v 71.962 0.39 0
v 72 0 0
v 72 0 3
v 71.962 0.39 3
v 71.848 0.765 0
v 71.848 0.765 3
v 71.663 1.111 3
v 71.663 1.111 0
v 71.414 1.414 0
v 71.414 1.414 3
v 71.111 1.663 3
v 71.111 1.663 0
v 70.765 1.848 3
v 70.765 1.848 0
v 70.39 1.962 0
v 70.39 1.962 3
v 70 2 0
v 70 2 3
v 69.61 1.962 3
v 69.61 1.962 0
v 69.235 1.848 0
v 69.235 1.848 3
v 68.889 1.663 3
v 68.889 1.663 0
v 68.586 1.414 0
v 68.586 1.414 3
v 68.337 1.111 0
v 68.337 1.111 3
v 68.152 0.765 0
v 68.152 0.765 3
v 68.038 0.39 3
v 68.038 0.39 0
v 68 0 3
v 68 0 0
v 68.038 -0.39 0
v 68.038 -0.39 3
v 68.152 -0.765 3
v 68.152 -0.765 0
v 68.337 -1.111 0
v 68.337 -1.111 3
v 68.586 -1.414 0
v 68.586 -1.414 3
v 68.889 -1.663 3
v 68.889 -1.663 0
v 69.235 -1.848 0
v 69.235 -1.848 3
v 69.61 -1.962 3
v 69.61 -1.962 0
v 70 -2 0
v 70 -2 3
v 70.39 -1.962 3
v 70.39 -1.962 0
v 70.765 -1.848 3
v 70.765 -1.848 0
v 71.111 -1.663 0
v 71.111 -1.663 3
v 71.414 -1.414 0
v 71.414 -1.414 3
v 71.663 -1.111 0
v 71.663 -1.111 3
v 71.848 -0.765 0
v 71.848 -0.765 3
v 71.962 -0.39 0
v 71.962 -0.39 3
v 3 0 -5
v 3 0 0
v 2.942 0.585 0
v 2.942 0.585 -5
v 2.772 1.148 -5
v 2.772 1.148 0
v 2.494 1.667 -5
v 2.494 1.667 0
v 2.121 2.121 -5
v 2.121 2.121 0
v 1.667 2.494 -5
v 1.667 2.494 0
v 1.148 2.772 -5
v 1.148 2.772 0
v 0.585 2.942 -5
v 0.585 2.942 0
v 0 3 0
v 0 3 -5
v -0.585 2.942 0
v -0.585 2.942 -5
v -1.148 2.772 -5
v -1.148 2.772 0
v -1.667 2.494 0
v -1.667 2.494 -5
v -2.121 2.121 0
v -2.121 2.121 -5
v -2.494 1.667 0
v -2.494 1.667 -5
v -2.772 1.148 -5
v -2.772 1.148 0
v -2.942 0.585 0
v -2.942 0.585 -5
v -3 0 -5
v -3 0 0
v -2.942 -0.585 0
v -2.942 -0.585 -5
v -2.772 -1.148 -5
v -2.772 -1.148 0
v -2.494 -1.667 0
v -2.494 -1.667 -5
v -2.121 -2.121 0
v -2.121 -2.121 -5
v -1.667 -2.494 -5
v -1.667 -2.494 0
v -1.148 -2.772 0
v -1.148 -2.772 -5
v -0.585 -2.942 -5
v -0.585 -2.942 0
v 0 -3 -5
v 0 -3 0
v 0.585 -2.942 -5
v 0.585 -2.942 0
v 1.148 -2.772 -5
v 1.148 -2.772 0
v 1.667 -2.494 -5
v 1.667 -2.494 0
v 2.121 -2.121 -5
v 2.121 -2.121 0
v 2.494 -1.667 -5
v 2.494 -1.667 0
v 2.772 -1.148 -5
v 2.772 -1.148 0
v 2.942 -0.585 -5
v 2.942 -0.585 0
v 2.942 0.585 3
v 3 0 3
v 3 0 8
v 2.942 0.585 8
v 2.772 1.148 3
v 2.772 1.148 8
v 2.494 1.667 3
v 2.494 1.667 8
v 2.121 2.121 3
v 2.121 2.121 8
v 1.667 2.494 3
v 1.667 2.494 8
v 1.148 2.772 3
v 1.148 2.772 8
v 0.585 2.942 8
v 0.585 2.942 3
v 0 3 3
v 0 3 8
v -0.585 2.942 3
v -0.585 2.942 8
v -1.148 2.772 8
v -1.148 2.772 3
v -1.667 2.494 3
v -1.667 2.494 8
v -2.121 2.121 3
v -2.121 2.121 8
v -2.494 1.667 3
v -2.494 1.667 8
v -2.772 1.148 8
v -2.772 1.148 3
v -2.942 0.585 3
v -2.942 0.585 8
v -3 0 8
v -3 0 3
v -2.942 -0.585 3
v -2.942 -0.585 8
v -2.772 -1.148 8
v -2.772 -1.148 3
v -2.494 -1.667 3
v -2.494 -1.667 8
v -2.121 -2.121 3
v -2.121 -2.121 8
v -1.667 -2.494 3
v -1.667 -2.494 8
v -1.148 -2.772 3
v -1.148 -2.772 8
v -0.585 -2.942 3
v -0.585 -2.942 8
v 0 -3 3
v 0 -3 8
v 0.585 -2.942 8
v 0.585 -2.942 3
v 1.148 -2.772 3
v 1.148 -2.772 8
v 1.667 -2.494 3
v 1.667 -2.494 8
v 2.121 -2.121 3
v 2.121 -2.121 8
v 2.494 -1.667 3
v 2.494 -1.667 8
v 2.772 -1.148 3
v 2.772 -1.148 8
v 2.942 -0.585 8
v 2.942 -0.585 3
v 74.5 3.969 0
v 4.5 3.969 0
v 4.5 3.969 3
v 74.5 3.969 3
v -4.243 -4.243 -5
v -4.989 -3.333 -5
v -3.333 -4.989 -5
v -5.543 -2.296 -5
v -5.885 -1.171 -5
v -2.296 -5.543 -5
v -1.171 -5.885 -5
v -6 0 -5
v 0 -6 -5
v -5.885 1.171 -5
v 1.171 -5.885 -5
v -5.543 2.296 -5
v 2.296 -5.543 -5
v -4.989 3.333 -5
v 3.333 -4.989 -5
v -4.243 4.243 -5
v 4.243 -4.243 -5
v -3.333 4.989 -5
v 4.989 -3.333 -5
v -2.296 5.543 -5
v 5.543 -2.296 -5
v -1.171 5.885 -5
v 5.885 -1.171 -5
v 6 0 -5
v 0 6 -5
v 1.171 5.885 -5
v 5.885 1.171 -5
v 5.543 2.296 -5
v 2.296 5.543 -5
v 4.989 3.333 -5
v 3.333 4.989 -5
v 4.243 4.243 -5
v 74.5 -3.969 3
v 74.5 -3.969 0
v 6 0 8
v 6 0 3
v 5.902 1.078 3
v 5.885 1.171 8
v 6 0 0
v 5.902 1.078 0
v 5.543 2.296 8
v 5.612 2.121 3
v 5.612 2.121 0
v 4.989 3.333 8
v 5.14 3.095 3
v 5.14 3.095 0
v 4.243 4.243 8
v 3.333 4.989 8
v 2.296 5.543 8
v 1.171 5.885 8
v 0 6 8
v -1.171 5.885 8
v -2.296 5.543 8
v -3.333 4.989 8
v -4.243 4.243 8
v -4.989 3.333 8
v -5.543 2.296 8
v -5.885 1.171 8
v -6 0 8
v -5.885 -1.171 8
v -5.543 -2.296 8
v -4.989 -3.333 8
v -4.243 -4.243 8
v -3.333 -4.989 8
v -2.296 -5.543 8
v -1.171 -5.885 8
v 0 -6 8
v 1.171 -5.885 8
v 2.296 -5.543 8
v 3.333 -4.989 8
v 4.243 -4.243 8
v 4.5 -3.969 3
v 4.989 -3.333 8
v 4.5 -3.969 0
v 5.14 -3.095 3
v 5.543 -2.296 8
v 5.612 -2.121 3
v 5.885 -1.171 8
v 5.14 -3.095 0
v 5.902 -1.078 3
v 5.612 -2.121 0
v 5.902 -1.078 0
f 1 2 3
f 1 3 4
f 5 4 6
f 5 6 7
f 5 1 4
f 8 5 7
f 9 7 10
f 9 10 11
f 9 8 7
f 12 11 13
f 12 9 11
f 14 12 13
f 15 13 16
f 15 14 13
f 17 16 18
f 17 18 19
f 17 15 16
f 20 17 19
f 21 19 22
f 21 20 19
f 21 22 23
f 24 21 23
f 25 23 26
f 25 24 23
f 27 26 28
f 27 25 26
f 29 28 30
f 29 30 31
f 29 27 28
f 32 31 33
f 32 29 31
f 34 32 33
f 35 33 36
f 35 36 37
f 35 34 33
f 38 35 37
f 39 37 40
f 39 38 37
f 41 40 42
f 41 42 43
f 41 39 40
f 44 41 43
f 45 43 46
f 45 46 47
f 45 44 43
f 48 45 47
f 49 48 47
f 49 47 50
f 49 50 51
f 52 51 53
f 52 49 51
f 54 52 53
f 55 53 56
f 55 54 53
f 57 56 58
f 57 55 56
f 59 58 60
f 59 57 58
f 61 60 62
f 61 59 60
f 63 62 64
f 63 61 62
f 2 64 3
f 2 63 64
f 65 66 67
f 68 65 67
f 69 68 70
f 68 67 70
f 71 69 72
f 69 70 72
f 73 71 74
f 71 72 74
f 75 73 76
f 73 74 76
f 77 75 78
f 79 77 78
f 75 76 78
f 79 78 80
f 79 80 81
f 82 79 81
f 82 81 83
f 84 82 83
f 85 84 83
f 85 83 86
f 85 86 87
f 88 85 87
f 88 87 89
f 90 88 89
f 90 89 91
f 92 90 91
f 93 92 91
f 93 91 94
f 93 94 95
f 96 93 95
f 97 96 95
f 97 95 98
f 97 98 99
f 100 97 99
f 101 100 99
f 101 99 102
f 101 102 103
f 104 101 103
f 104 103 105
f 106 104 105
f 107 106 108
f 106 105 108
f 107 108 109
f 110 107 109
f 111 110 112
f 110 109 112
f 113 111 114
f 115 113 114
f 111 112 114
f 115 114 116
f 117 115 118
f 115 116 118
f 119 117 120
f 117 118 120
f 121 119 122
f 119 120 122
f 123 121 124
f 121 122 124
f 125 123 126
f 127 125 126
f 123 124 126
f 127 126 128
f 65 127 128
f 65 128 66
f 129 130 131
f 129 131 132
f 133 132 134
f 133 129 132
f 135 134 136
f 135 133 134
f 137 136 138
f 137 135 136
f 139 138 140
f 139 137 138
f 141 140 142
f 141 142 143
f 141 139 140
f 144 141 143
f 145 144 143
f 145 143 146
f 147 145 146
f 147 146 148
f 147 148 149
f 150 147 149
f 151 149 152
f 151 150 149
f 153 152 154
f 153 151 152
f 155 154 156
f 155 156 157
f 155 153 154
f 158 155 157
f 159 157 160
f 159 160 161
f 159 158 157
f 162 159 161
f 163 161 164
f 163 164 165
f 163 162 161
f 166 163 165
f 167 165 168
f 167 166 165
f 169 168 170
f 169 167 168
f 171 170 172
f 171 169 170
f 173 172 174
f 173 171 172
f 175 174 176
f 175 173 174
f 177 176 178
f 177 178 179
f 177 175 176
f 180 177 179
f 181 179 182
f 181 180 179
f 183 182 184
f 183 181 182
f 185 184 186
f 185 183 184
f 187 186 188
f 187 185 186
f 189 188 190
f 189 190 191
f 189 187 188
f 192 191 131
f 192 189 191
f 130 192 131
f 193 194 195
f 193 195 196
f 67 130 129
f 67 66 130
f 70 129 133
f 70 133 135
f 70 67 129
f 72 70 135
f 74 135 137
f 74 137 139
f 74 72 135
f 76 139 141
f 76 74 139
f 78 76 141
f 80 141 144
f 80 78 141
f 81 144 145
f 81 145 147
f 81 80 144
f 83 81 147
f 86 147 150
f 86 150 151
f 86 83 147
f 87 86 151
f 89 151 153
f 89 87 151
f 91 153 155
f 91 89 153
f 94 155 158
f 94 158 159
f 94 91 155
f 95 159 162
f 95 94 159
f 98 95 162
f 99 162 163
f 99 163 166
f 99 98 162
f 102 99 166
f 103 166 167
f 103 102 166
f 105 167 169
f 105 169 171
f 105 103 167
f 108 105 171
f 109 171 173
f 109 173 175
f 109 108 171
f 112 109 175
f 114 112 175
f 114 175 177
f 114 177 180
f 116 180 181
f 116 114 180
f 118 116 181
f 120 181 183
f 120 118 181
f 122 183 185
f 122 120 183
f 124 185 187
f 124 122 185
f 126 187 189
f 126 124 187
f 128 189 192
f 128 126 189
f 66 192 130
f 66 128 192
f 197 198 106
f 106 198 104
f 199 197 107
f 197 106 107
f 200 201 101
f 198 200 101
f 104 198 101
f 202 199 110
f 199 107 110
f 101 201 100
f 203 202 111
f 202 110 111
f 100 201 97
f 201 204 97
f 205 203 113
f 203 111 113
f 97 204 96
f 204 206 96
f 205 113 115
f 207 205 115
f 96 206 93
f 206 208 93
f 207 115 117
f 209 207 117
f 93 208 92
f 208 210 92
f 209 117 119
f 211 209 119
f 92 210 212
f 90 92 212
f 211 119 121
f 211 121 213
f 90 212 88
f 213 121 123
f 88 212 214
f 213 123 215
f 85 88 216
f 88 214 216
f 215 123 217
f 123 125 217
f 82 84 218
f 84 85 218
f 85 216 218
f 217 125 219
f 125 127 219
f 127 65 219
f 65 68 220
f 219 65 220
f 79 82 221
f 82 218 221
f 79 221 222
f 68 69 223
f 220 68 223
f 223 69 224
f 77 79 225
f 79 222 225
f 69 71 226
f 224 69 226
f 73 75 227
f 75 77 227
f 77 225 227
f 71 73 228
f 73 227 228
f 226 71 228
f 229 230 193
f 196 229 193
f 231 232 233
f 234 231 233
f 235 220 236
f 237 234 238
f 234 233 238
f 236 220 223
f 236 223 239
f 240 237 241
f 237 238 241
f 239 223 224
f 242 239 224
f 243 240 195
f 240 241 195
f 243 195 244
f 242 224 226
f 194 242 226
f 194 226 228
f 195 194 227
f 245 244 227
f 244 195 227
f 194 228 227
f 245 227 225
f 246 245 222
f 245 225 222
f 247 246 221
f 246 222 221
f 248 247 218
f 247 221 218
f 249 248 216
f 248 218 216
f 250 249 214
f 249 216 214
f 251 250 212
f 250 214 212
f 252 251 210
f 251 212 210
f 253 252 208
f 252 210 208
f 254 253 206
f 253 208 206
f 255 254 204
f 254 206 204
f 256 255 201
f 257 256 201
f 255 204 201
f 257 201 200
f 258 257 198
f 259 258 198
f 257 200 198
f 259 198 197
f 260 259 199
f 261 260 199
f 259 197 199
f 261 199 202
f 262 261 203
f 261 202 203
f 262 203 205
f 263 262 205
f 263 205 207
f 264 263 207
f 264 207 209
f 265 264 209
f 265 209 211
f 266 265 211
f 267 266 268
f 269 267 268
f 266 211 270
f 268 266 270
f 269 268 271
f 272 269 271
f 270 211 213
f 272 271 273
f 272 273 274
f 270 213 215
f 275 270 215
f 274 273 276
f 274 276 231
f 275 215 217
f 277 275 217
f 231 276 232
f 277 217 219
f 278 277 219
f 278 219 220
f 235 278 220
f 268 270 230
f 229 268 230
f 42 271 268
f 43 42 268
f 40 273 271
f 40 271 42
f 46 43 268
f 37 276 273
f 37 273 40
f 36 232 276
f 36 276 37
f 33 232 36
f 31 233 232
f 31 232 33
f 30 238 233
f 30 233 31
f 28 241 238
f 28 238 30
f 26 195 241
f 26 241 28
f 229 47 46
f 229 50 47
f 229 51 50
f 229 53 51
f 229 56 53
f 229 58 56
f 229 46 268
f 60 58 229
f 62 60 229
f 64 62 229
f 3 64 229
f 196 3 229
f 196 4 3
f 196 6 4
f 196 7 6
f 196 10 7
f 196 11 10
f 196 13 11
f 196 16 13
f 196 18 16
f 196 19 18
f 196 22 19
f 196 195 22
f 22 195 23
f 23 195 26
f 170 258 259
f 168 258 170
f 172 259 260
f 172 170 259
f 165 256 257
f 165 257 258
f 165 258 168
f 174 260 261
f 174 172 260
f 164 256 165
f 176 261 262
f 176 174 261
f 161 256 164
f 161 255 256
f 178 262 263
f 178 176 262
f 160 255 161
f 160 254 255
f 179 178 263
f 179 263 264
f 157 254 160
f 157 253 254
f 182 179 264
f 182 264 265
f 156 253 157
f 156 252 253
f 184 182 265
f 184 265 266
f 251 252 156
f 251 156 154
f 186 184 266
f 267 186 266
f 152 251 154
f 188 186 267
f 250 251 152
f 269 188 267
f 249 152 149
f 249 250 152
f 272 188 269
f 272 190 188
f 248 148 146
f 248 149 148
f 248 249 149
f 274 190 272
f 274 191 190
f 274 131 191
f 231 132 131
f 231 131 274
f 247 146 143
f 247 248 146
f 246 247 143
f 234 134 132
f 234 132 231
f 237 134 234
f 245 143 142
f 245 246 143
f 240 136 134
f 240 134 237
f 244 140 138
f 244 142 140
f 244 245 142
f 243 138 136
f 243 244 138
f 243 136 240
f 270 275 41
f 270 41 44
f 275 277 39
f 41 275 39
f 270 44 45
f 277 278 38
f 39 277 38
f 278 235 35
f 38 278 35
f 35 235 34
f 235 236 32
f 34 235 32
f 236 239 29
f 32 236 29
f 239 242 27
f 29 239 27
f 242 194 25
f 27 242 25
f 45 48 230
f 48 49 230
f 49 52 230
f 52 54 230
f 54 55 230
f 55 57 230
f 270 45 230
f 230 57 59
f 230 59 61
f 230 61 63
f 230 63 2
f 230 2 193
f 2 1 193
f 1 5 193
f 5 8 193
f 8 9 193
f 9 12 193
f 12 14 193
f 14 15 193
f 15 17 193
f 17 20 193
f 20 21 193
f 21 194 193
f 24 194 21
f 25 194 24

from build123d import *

# Parameters (mm, degrees)
SKETCH1_R                = 6
SKETCH1_R_2              = 3
SKETCH1_W                = 70
SKETCH1_H                = 7.937253934
SKETCH1_R_3              = 2
BOSS_EXTRUDE1_DEPTH      = 3
SKETCH2_R                = 6
SKETCH2_R_2              = 3
BOSS_EXTRUDE2_DEPTH      = 5
BOSS_EXTRUDE2_DEPTH_BACK = 8


with BuildPart() as part:
    # Sketch1 → Boss-Extrude1 (new body)
    with BuildSketch(Plane.XY):
        Circle(SKETCH1_R)
        Circle(SKETCH1_R_2, mode=Mode.SUBTRACT)
        with Locations((39.5, 0)):
            Rectangle(SKETCH1_W, SKETCH1_H)
        with Locations((70, 0)):
            Circle(SKETCH1_R_3, mode=Mode.SUBTRACT)
    extrude(amount=BOSS_EXTRUDE1_DEPTH)

    # Sketch2 → Boss-Extrude2 (add, two sides)
    with BuildSketch(Plane.XY.offset(3)) as boss_extrude2_sk:
        Circle(SKETCH2_R)
        Circle(SKETCH2_R_2, mode=Mode.SUBTRACT)
    extrude(amount=BOSS_EXTRUDE2_DEPTH)
    extrude(boss_extrude2_sk.sketch, amount=-BOSS_EXTRUDE2_DEPTH_BACK)


solid = part.part
